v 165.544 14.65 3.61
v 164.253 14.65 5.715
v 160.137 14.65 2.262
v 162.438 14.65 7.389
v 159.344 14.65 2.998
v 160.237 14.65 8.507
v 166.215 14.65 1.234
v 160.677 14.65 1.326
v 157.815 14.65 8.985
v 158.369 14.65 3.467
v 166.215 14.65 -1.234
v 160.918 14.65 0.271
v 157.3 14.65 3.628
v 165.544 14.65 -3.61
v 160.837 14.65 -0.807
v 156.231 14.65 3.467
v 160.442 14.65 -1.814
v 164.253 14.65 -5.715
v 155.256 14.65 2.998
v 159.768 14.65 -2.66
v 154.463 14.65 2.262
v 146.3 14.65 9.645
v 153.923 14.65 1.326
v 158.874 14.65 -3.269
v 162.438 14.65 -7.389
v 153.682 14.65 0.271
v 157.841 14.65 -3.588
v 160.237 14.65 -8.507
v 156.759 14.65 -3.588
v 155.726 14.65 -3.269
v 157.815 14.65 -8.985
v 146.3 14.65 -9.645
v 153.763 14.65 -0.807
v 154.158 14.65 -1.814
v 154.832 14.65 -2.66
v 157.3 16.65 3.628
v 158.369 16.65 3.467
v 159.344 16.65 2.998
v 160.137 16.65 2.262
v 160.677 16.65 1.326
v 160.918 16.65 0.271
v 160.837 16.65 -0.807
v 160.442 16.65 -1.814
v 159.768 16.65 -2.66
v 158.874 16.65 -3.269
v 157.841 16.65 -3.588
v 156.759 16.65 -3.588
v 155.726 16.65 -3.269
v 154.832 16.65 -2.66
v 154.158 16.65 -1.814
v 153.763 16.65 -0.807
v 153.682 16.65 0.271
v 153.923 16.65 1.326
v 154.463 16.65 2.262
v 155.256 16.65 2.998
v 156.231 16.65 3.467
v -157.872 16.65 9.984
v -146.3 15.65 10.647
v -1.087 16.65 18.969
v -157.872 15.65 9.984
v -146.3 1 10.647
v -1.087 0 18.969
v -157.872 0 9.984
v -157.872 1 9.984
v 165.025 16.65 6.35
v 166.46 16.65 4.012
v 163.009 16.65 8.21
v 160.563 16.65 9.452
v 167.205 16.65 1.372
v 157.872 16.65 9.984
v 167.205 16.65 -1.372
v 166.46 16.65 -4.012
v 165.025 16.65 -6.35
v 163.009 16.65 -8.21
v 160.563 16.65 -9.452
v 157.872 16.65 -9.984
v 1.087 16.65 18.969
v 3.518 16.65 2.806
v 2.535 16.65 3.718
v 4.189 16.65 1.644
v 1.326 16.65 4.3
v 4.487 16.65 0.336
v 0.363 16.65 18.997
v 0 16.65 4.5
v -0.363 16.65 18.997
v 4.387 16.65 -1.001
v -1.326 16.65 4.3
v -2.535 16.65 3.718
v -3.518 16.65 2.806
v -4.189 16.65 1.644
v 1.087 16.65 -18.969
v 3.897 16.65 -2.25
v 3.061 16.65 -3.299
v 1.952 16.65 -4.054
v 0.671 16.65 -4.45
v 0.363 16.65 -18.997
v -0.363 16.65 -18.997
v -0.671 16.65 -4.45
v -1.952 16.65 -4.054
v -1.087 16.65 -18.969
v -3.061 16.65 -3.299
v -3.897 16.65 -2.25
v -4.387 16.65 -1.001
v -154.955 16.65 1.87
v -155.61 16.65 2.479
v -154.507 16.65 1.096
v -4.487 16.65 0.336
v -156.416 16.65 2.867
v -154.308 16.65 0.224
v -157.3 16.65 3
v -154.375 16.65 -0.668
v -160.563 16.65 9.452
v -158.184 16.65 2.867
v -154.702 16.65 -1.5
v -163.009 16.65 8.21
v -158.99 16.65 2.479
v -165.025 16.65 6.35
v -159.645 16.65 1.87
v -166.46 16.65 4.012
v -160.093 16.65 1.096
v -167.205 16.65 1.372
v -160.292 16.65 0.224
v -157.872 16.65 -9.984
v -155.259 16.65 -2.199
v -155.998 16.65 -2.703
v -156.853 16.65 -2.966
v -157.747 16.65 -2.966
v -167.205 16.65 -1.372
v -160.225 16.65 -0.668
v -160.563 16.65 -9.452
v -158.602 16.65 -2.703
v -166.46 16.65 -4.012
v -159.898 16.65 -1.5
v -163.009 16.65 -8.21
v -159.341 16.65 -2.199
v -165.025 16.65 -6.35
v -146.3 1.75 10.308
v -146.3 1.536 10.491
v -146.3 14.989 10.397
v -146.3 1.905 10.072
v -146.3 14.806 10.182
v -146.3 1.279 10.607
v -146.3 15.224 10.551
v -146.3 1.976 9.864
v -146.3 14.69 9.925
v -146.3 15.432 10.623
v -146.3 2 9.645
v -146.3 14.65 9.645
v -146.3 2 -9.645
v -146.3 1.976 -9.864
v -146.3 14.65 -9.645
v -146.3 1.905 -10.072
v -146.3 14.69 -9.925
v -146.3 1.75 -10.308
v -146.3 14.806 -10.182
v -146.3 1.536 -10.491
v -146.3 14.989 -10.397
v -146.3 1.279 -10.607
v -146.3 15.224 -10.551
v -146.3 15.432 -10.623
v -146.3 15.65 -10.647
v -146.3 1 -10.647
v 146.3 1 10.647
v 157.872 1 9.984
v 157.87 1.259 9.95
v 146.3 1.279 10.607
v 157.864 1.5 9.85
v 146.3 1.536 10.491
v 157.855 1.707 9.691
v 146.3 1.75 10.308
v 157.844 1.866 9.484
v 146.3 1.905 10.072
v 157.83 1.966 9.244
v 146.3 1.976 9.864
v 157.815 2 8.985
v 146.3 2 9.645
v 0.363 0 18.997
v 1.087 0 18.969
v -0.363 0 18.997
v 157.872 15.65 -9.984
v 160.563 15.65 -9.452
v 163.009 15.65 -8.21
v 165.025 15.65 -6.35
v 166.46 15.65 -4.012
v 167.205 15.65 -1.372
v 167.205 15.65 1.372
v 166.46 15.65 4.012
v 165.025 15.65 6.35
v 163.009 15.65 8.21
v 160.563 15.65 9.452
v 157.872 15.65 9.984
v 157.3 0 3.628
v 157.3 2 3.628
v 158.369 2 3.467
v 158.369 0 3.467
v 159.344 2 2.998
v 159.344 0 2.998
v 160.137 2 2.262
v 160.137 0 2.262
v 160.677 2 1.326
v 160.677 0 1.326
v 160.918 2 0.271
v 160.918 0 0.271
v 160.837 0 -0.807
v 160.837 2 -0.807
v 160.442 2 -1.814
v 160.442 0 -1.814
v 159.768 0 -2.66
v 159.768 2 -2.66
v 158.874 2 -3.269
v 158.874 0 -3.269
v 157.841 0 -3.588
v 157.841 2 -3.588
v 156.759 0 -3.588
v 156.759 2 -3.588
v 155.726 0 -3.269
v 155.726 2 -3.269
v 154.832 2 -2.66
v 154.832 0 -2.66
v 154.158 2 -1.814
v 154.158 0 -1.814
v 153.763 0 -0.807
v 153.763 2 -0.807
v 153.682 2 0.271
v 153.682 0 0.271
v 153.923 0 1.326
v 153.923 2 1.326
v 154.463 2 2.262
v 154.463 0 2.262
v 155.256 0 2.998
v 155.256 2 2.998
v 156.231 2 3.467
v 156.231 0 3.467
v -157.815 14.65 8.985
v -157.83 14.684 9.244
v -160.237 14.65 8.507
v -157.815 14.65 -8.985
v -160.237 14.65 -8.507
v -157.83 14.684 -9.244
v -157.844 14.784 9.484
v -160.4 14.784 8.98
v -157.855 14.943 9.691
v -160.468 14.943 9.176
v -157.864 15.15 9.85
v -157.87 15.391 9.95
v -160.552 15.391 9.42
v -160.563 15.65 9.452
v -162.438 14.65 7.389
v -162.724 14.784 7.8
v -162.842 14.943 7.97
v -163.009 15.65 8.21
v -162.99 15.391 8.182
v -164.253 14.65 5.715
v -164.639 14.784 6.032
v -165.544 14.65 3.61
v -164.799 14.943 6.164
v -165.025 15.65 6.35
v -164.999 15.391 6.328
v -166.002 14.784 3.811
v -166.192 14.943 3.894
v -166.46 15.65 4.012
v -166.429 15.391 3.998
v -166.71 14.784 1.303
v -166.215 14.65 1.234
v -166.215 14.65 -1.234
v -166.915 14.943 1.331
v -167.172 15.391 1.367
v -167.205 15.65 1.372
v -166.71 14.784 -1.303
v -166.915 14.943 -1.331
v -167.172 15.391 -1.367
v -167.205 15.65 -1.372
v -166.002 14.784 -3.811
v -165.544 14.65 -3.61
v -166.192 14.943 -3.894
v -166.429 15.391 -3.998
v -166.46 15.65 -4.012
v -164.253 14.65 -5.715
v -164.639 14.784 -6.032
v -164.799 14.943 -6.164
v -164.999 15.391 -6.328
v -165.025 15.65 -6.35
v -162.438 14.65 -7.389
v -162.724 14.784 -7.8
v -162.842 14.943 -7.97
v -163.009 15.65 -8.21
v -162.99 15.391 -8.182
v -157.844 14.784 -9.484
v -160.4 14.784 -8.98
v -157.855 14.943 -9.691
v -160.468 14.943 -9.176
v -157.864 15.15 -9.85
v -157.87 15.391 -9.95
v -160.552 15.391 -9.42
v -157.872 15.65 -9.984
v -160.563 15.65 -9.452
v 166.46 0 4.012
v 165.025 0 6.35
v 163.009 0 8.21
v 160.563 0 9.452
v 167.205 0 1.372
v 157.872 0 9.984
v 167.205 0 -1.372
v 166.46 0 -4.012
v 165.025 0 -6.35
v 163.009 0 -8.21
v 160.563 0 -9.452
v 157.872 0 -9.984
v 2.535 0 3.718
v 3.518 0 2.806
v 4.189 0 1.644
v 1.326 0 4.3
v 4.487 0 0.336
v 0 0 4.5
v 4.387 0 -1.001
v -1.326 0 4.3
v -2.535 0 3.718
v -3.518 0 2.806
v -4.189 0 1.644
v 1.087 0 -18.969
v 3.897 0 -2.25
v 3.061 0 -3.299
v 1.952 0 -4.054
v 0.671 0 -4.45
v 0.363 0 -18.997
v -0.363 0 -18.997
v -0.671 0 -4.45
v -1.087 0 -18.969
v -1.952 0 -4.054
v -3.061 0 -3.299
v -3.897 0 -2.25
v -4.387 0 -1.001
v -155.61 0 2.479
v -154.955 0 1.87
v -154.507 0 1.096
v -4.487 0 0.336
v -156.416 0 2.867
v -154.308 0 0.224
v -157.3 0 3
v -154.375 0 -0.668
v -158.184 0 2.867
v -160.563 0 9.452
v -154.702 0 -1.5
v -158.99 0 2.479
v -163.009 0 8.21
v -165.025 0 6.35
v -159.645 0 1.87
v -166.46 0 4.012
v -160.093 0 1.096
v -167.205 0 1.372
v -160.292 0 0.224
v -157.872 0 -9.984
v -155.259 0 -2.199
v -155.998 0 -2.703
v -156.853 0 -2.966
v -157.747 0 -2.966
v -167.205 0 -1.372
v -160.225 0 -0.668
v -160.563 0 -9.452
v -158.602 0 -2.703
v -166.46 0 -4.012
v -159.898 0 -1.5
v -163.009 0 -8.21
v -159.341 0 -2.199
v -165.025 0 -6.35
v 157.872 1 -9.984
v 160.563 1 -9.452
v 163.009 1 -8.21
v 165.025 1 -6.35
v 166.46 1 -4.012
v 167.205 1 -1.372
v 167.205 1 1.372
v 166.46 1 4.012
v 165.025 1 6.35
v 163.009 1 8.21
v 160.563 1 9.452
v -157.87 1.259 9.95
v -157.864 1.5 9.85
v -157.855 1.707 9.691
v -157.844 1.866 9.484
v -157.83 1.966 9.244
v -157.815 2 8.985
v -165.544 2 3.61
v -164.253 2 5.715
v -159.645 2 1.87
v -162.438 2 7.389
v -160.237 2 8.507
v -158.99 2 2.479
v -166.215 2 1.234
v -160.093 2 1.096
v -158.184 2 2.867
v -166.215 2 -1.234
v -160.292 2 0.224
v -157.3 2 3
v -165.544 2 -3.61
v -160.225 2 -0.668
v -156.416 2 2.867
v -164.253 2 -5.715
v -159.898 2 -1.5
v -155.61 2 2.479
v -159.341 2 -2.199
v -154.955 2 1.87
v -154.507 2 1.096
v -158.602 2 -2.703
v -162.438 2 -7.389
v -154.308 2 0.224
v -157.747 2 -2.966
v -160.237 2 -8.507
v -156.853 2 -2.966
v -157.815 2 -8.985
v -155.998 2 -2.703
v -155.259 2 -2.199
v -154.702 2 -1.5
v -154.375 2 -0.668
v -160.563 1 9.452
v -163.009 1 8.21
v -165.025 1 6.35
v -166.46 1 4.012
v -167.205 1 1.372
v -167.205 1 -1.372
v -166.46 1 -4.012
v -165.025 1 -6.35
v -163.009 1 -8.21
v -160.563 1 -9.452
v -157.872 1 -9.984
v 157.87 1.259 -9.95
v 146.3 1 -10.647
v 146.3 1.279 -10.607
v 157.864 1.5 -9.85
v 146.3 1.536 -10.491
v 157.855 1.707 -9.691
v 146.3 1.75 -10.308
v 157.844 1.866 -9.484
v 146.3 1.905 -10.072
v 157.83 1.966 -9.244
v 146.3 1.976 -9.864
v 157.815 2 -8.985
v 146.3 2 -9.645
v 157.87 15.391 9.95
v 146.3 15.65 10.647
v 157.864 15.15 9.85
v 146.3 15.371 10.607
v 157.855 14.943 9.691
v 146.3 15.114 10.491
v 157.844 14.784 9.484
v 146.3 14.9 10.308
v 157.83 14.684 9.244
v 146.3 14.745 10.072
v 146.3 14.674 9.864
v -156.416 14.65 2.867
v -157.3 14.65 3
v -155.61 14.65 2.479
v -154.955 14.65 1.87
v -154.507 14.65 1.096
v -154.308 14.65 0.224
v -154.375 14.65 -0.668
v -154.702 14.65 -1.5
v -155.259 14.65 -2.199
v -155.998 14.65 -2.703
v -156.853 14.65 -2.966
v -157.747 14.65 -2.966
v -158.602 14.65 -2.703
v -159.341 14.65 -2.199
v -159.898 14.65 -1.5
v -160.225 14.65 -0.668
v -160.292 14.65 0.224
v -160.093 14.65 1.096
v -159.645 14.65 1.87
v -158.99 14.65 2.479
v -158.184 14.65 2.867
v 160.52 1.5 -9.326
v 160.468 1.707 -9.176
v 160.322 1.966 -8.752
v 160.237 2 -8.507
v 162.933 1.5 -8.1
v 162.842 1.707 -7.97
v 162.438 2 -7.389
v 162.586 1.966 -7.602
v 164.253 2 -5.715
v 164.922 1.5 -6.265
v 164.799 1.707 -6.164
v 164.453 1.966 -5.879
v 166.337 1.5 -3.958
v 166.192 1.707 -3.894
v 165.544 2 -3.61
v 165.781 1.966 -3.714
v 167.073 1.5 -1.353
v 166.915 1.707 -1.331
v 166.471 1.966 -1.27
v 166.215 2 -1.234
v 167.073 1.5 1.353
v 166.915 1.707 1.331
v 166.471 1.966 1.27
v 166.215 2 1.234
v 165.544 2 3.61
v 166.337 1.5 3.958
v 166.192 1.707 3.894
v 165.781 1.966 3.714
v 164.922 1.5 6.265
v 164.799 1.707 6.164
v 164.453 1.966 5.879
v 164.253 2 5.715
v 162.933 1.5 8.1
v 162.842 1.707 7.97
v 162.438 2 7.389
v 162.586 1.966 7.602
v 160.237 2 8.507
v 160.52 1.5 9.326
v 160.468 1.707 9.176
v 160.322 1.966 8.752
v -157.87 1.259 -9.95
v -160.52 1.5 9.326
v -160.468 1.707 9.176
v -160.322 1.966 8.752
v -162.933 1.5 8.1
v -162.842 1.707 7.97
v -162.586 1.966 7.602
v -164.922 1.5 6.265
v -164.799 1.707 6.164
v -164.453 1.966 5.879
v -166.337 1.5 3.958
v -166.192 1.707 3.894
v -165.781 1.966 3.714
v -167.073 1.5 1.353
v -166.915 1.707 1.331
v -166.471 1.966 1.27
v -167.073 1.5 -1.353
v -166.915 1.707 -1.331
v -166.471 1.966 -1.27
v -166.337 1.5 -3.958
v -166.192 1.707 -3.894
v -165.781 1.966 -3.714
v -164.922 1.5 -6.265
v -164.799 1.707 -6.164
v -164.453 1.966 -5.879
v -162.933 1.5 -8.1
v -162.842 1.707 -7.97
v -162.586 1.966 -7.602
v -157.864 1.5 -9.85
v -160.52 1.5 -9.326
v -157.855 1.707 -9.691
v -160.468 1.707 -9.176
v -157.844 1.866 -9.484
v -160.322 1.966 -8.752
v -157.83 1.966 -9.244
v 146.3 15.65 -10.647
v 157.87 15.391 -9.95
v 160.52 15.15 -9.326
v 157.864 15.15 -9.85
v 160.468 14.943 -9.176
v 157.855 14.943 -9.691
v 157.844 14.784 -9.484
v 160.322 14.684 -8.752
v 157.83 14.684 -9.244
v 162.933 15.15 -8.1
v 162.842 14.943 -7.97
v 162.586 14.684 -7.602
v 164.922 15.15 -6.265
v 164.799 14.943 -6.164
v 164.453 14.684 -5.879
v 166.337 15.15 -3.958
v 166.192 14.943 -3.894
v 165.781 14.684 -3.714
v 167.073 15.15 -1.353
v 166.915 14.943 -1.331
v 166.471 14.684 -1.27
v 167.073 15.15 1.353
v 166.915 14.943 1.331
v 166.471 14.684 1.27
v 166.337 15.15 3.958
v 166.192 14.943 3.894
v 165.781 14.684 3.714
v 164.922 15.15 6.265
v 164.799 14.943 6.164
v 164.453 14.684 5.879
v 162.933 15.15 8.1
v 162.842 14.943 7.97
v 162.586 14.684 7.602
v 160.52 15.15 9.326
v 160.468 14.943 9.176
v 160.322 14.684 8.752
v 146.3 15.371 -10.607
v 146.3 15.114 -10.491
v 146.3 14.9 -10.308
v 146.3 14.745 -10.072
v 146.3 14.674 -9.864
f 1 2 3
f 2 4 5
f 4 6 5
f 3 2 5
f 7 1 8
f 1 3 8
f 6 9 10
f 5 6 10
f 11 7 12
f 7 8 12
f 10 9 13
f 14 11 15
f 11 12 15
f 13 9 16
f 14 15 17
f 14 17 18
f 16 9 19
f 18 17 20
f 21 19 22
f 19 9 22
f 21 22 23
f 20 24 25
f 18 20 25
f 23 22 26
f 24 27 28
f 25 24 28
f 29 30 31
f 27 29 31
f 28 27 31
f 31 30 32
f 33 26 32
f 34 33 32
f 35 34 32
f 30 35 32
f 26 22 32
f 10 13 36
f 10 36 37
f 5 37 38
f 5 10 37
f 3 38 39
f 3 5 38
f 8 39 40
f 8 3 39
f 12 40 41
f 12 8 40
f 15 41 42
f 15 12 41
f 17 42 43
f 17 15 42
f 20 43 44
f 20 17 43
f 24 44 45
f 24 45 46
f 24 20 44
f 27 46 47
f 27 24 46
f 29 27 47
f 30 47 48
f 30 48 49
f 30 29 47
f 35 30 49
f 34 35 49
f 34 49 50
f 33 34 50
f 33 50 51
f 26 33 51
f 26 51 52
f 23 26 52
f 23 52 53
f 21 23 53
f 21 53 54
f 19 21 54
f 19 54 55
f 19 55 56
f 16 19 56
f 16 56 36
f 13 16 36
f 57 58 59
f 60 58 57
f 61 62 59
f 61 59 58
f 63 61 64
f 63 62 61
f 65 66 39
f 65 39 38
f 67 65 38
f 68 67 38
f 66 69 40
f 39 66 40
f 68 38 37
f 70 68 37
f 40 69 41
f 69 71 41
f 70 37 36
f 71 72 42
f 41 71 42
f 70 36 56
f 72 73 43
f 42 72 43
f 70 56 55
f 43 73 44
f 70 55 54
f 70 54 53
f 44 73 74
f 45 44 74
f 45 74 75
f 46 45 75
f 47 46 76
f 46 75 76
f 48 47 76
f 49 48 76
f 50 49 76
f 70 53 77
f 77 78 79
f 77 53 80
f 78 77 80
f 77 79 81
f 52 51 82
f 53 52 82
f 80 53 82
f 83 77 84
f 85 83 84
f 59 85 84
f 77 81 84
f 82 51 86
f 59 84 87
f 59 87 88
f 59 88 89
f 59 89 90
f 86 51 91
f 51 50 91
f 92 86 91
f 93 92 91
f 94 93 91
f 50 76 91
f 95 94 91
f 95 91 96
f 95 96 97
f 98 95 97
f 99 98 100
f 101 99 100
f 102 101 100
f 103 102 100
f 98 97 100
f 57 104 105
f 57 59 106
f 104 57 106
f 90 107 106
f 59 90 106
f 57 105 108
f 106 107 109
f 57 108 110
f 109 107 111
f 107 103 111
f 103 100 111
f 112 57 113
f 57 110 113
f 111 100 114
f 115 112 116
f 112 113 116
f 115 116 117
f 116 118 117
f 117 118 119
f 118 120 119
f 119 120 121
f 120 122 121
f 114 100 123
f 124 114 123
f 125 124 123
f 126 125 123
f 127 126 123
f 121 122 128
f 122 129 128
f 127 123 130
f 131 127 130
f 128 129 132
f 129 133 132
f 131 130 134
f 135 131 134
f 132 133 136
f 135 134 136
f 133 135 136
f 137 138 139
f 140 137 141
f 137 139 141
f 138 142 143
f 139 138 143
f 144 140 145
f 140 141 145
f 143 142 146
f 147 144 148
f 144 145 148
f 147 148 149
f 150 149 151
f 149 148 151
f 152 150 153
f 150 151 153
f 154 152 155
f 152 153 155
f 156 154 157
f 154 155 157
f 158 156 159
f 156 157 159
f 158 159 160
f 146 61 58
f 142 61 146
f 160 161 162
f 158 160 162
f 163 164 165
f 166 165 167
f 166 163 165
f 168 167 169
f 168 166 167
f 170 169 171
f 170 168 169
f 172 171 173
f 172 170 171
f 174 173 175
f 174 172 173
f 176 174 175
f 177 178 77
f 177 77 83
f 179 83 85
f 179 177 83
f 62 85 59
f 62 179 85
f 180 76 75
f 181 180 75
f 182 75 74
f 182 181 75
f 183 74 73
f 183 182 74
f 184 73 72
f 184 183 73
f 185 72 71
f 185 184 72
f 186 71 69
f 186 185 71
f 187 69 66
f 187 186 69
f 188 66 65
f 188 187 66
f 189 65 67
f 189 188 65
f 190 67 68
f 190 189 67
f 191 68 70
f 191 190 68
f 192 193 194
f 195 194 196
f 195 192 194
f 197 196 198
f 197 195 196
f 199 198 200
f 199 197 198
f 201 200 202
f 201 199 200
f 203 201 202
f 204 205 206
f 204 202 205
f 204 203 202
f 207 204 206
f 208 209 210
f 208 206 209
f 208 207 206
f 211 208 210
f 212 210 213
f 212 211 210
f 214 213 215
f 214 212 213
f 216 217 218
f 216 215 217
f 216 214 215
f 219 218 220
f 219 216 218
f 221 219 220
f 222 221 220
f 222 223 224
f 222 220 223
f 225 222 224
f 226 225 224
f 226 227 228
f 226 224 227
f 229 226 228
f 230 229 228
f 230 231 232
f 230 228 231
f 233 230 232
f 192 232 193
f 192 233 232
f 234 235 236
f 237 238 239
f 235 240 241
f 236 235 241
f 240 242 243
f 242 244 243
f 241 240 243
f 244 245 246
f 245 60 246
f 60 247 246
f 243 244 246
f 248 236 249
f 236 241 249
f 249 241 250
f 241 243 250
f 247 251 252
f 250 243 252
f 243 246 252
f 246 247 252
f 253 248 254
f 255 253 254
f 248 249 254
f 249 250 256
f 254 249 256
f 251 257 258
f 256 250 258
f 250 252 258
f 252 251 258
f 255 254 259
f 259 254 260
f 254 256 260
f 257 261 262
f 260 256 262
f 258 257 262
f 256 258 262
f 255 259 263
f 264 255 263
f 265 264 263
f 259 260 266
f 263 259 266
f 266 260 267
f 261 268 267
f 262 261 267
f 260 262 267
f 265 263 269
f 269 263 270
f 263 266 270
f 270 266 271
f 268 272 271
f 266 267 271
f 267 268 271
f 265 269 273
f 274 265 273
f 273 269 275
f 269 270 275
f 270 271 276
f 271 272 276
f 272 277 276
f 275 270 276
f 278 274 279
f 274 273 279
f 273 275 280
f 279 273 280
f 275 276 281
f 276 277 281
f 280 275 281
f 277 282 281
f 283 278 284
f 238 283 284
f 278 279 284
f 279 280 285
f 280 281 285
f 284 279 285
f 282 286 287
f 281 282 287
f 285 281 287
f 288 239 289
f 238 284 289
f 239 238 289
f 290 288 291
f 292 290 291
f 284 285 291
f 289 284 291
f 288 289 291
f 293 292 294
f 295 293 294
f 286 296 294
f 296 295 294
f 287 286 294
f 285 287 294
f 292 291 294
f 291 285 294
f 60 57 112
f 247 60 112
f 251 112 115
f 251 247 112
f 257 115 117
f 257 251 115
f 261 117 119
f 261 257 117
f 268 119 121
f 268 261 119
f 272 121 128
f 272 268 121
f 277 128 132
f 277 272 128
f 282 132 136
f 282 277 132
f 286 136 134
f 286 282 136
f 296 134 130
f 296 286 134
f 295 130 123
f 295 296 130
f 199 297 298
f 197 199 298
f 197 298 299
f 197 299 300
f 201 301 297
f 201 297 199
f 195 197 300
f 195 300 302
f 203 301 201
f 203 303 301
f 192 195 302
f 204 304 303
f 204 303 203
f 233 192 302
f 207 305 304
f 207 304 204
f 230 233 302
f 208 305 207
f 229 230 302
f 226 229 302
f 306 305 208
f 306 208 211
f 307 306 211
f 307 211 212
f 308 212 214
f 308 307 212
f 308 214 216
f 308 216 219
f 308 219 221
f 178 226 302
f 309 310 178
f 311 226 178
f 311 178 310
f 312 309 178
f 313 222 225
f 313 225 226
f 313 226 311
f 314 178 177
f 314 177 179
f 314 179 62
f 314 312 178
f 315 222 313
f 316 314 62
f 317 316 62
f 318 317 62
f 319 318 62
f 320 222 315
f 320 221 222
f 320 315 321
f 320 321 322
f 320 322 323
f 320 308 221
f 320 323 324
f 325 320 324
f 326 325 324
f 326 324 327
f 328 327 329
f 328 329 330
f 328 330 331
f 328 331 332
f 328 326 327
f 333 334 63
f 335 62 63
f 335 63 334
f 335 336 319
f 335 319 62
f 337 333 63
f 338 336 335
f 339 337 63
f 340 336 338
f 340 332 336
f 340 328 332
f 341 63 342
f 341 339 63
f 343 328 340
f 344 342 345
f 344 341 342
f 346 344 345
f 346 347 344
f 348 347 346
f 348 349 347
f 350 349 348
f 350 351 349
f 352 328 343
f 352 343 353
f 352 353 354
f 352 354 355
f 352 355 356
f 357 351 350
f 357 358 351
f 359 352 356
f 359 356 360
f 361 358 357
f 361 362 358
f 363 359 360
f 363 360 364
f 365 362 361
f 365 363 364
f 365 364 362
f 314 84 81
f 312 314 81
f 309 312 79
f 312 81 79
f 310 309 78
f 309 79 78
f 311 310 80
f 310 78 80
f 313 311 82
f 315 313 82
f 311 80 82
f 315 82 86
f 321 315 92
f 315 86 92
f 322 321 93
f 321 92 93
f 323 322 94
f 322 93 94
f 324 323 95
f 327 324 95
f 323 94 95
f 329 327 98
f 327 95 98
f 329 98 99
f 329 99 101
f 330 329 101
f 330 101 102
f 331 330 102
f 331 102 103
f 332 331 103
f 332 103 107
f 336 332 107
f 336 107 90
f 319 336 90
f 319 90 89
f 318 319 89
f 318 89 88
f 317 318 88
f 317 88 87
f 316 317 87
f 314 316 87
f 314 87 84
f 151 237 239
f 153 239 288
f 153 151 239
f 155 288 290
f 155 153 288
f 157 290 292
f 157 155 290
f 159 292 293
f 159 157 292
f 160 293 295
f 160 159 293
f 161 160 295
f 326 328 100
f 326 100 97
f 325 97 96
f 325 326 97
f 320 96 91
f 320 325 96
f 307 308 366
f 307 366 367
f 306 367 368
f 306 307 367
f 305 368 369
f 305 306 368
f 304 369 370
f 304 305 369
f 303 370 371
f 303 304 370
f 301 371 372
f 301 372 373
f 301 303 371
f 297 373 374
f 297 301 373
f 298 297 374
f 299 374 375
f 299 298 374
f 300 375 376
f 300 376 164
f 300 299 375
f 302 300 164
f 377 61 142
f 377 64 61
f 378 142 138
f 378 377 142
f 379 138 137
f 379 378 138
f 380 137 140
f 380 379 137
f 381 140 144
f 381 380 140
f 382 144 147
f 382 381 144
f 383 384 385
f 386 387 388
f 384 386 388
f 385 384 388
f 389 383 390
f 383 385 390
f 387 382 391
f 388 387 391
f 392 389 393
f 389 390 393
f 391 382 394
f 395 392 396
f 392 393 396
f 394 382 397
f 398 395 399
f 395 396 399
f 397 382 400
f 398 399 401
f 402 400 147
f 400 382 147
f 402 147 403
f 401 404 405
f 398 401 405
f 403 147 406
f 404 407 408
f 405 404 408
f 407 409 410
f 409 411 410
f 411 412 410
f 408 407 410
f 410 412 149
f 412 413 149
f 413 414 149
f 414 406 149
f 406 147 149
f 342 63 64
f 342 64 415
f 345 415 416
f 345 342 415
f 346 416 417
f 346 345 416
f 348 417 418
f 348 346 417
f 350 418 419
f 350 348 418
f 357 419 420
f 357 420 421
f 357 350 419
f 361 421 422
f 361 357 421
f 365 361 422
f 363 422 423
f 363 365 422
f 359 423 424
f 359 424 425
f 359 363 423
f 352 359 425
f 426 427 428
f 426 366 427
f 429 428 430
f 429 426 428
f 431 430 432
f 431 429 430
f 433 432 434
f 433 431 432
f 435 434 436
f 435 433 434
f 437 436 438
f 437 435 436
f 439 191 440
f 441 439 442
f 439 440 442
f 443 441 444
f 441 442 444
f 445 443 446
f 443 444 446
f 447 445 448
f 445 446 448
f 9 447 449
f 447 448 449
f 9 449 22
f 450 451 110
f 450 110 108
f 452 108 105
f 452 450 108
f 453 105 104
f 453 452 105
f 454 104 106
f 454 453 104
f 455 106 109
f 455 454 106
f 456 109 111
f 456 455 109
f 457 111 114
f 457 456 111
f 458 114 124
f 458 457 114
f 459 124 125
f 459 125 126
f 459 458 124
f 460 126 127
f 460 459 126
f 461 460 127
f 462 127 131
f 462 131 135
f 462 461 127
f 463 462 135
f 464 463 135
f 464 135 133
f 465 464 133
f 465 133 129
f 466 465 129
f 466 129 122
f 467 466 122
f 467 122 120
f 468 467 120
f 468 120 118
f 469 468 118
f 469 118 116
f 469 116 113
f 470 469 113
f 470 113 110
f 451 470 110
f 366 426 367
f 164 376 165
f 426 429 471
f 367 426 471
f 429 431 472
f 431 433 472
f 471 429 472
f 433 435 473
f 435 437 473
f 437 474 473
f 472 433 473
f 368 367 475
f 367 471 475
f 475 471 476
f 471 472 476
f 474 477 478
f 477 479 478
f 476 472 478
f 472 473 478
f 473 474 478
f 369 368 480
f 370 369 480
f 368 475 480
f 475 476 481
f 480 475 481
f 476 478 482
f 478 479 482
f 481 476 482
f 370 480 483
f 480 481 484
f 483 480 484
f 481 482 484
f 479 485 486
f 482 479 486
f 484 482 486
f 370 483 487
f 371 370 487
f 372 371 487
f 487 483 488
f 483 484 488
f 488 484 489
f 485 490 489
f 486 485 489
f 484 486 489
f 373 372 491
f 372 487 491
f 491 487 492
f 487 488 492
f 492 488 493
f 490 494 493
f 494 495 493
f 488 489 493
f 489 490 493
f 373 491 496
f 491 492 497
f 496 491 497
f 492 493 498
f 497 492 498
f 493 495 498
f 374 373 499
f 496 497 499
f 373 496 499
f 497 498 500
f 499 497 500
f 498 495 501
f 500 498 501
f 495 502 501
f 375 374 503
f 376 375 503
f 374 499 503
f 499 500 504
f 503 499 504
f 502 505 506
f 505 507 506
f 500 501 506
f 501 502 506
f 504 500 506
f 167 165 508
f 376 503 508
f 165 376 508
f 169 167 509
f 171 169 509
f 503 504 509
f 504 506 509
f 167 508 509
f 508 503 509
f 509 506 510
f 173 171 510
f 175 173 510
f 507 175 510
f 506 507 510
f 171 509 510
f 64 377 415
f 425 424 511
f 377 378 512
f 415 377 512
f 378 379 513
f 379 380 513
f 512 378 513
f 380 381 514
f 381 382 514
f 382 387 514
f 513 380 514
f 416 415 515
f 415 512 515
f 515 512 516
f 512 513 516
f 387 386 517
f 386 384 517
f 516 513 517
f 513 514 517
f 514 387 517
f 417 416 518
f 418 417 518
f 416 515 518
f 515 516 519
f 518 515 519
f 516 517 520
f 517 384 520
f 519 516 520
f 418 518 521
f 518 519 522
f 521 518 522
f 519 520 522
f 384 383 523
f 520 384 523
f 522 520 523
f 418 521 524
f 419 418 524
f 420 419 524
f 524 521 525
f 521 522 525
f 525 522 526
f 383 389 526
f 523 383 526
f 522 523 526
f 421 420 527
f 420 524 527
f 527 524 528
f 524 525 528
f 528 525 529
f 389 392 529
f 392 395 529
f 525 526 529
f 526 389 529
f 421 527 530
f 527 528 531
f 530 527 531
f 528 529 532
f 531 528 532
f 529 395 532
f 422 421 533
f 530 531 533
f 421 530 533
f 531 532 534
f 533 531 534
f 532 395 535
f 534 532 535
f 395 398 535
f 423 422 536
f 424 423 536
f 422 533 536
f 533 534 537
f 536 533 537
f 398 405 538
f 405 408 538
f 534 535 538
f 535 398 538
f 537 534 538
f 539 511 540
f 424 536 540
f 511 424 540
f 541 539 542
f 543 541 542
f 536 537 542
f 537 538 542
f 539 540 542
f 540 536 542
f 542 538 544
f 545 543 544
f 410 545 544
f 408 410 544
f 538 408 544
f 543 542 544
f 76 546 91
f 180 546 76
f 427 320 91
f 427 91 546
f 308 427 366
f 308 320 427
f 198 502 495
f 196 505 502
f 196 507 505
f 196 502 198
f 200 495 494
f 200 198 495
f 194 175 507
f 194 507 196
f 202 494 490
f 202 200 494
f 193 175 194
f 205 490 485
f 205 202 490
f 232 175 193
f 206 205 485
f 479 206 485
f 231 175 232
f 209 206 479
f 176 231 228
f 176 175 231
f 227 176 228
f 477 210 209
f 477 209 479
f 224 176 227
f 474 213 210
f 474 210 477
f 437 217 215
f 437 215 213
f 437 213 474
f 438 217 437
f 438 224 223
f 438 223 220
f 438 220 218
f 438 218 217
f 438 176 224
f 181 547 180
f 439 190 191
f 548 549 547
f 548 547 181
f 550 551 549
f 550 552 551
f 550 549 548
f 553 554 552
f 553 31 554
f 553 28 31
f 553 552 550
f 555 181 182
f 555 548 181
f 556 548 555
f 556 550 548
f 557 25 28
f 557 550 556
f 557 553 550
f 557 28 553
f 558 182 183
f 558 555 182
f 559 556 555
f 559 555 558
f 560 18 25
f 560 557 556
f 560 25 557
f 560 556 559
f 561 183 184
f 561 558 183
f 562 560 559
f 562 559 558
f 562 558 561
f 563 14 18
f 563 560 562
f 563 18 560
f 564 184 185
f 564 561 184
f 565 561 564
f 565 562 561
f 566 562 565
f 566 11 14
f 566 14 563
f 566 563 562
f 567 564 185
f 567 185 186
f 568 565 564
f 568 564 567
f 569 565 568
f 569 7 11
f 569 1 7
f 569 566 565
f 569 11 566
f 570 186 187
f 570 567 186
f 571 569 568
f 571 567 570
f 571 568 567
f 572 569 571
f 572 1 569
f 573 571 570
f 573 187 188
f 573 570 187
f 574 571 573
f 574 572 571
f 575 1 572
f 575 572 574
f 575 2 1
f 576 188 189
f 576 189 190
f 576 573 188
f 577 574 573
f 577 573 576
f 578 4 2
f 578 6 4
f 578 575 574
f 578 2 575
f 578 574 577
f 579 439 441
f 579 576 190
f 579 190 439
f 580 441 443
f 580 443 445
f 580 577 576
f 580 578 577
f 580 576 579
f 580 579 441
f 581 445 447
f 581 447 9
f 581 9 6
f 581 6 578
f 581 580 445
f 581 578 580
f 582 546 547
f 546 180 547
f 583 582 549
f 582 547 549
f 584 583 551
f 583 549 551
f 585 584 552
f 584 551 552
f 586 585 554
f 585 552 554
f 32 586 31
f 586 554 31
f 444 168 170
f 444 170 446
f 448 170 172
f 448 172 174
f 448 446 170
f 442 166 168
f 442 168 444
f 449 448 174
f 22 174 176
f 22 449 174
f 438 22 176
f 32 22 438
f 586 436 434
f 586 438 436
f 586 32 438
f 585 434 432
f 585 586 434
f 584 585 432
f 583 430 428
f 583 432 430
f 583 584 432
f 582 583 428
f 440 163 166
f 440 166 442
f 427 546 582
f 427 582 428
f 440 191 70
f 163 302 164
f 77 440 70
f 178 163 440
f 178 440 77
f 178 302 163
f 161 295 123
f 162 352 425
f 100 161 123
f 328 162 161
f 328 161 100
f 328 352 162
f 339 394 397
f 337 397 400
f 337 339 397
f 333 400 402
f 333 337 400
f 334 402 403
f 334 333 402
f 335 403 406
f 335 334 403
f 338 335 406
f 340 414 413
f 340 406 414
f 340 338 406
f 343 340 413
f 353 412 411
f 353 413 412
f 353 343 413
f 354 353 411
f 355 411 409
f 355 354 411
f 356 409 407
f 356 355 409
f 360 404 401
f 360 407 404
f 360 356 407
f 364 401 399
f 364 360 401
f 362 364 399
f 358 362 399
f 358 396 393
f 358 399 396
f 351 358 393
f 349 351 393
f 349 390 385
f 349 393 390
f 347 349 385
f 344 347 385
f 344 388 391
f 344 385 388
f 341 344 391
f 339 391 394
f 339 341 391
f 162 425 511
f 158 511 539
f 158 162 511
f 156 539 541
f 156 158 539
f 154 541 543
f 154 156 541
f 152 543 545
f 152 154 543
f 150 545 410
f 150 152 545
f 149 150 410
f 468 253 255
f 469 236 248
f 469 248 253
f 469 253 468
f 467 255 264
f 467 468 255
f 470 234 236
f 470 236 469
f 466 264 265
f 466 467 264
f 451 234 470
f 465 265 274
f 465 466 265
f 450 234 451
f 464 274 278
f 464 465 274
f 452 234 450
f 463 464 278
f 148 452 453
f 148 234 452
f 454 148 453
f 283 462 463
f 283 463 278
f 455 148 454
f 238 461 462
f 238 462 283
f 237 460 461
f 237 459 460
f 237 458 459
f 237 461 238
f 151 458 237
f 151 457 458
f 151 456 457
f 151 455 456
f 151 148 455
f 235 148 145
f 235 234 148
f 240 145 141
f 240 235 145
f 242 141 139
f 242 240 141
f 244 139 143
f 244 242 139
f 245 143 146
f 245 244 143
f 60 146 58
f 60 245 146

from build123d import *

# Parameters (mm, degrees)
SKETCH1_R           = 18
SKETCH1_R_2         = 3
SKETCH1_R_3         = 3.628209061
BOSS_EXTRUDE1_DEPTH = 16.65
SKETCH2_W           = 30
SKETCH2_H           = 12.65
CUT_EXTRUDE2_DEPTH  = 11
CUT_EXTRUDE3_REACH  = 171.197
SKETCH3_R           = 4.5
FILLET2_R           = 1


with BuildPart() as part:
    # Sketch1 → Boss-Extrude1 (new body)
    with BuildSketch(Plane(origin=(0, 0, 0), x_dir=(1, 0, 0), z_dir=(0, 1, 0))):
        with BuildLine():
            Line((-1.087094723, -18.968875166), (-157.872155118, -9.983618508))
            ThreePointArc((-157.872155118, -9.983618508), (-167.3, 0), (-157.872155118, 9.983618508))
            Line((-157.872155118, 9.983618508), (-1.087094723, 18.968875166))
            ThreePointArc((-1.087094723, 18.968875166), (0, 19), (1.087094723, 18.968875166))
            Line((1.087094723, 18.968875166), (157.872155118, 9.983618508))
            ThreePointArc((157.872155118, 9.983618508), (167.3, 0), (157.872155118, -9.983618508))
            Line((157.872155118, -9.983618508), (1.087094723, -18.968875166))
            ThreePointArc((1.087094723, -18.968875166), (0, -19), (-1.087094723, -18.968875166))
        make_face()
        Circle(SKETCH1_R, mode=Mode.SUBTRACT)
        with Locations(Location((-157.3, 0, 0), (0, 0, 270))):
            Circle(SKETCH1_R_2, mode=Mode.SUBTRACT)
        with Locations(Location((157.3, 0, 0), (0, 0, 270))):
            Circle(SKETCH1_R_3, mode=Mode.SUBTRACT)
        Circle(SKETCH1_R)
    extrude(amount=BOSS_EXTRUDE1_DEPTH)

    # Sketch2 → Cut-Extrude2 (cut, symmetric)
    with BuildSketch(Plane(origin=(-157.3, 0, 0), x_dir=(0, 0, -1), z_dir=(1, 0, 0))):
        with Locations((0, 8.325)):
            Rectangle(SKETCH2_W, SKETCH2_H)
    cut_extrude2 = extrude(amount=CUT_EXTRUDE2_DEPTH, both=True, mode=Mode.SUBTRACT)

    # Mirror1: Cut-Extrude2 across plane
    add(cut_extrude2.mirror(Plane(origin=(0, 0, 0), x_dir=(0, 0, 1), z_dir=(1, 0, 0))), mode=Mode.SUBTRACT)

    # Sketch3 → Cut-Extrude3 (cut, up to next)
    with BuildSketch(Plane(origin=(0, 16.65, 0), x_dir=(1, 0, 0), z_dir=(0, 1, 0)), mode=Mode.PRIVATE) as cut_extrude3_sk1:
        with Locations(Location((0, 0, 0), (0, 0, 270))):
            Circle(SKETCH3_R)
    cut_extrude3_tool1 = extrude(cut_extrude3_sk1.sketch, amount=-CUT_EXTRUDE3_REACH, mode=Mode.PRIVATE) & part.part
    add(cut_extrude3_tool1.solids().sort_by_distance((0, 16.65, 0))[0], mode=Mode.SUBTRACT)

    # Fillet2
    fillet2_edges = [part.edges().sort_by_distance(p)[0] for p in [
        (-167.3, 2, 0),
        (-167.3, 14.65, 0),
        (-152.086077559, 14.65, 10.315215102),
        (-152.086077559, 2, 10.315215102),
        (-152.086077559, 14.65, -10.315215102),
        (-152.086077559, 2, -10.315215102),
        (152.086077559, 2, -10.315215102),
        (167.3, 2, 0),
        (167.3, 14.65, 0),
        (152.086077559, 14.65, -10.315215102),
        (152.086077559, 2, 10.315215102),
        (152.086077559, 14.65, 10.315215102),
    ]]
    fillet(fillet2_edges, radius=FILLET2_R)


solid = part.part
